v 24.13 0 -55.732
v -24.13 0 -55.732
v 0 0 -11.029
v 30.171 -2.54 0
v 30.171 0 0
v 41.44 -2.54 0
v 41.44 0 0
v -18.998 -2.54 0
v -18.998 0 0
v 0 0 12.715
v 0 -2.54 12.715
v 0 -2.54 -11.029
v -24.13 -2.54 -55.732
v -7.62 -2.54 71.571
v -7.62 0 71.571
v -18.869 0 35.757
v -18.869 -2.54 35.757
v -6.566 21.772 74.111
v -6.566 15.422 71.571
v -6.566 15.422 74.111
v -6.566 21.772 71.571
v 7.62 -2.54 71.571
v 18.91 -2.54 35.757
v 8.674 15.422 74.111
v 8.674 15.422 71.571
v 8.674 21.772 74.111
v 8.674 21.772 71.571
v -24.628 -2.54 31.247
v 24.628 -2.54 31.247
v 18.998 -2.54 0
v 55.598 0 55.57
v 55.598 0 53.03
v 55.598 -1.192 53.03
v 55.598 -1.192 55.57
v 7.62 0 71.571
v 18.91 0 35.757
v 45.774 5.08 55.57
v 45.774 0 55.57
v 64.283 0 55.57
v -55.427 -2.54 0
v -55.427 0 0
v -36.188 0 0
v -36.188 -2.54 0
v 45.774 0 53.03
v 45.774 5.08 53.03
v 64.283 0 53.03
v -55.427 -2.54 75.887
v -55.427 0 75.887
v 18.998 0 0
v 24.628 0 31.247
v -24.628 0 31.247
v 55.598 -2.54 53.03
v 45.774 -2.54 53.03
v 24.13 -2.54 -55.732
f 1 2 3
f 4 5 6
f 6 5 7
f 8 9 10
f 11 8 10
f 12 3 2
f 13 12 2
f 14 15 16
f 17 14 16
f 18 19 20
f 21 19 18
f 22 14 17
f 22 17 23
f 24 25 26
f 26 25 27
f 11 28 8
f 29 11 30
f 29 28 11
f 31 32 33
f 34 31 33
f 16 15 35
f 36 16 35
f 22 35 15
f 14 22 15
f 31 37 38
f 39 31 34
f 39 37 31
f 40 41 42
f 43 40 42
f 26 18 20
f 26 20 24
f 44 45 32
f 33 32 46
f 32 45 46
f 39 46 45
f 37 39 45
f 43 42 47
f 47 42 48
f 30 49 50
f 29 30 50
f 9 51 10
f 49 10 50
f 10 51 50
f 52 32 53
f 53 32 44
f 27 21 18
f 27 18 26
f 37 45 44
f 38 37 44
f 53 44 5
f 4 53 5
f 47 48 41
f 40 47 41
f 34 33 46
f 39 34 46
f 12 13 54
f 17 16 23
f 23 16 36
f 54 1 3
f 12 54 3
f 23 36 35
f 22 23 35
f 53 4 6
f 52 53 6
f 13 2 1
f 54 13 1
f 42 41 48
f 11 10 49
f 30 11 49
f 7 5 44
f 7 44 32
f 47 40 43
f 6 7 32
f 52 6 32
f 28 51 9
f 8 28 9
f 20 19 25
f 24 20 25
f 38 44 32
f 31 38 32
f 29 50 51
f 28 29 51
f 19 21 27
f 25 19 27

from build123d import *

# Parameters (mm, degrees)
F1_DEPTH  = 2.54
F3_DEPTH  = 2.54
F5_DEPTH  = 2.54
F6_W      = 15.24
F6_H      = 6.35
F7_DEPTH  = 2.54
F9_DEPTH  = 2.54
F11_DEPTH = 2.54
F13_DEPTH = 2.54


with BuildPart() as f1:
    # F0 (on Front) → F1 (new body)
    with BuildSketch(Plane.XZ):
        Polygon((-18.997625, 0), (0, 12.714945), (18.997625, 0), (24.628362, 31.246717), (-24.628362, 31.246717), align=None)
    extrude(amount=F1_DEPTH)


with BuildPart() as f3:
    # F2 (on Front) → F3 (new body)
    with BuildSketch(Plane.XZ):
        Polygon((-24.13, -55.732161), (0, -55.732161), (24.13, -55.732161), (0, -11.028882), align=None)
    extrude(amount=F3_DEPTH)


with BuildPart() as f5:
    # F4 (on Front) → F5 (new body)
    with BuildSketch(Plane.XZ):
        Polygon((-7.62, 71.571359), (-18.869227, 35.757359), (0, 35.757359), (0, 71.571359), align=None)
        Polygon((0, 71.571359), (0, 35.757359), (18.90967, 35.757359), (7.62, 71.571359), align=None)
    extrude(amount=F5_DEPTH)


with BuildPart() as f7:
    # F6 (on face) → F7 (new body)
    with BuildSketch(Plane.XY.offset(71.571359)):
        with Locations((1.054293, 18.596774)):
            Rectangle(F6_W, F6_H)
    extrude(amount=F7_DEPTH)


with BuildPart() as f9:
    # F8 (on Front) → F9 (new body)
    with BuildSketch(Plane.XZ):
        Polygon((45.773722, 53.030446), (30.171156, 0), (41.439675, 0), (55.597566, 53.030446), align=None)
    extrude(amount=F9_DEPTH)


with BuildPart() as f11:
    # F10 (on face) → F11 (new body)
    with BuildSketch(Plane.XY.offset(53.030446)):
        Polygon((45.773722, 5.08), (45.773722, 0), (55.597566, 0), (55.597566, -1.191878), (64.282849, 0), align=None)
    extrude(amount=F11_DEPTH)


with BuildPart() as f13:
    # F12 (on Front) → F13 (new body)
    with BuildSketch(Plane.XZ):
        Polygon((-55.426776, 0), (-36.187731, 0), (-55.426776, 75.887345), align=None)
    extrude(amount=F13_DEPTH)


solid = Compound([f1.part, f3.part, f5.part, f7.part, f9.part, f11.part, f13.part])
